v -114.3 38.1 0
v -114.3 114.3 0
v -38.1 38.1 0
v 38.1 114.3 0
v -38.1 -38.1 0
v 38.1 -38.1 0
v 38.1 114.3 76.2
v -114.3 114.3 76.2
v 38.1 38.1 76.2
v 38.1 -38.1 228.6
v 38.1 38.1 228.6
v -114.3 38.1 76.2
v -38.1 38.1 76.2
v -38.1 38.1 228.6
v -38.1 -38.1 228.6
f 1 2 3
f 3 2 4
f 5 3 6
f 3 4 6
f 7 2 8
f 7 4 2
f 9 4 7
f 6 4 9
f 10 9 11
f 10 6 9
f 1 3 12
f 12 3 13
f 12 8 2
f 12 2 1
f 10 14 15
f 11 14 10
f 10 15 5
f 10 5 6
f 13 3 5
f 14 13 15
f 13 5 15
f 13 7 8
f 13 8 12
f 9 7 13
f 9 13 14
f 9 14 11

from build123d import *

# Parameters (mm, degrees)
F1_W     = 76.2
F1_H     = 76.2
F2_DEPTH = 228.6
F3_W     = 76.2
F3_H     = 76.2
F4_DEPTH = 76.2
F5_W     = 76.2
F5_H     = 76.2
F6_DEPTH = 76.2


# Not quite as in the source:
# - a variable given as a bare number and used for a length is read in inches; the dataset says mm whatever the document's units were


with BuildPart() as f2:
    # F1 (on Top) → F2 (new body)
    with BuildSketch(Plane.XY):
        Rectangle(F1_W, F1_H)
    extrude(amount=F2_DEPTH)

    # F3 (on face) → F4 (join)
    with BuildSketch(Plane(origin=(0, 38.1, 0), x_dir=(-1, 0, 0), z_dir=(0, 1, 0))):
        with Locations((0, 38.1)):
            Rectangle(F3_W, F3_H)
    extrude(amount=F4_DEPTH)

    # F5 (on face) → F6 (join)
    with BuildSketch(Plane(origin=(-38.1, 0, 0), x_dir=(0, -1, 0), z_dir=(-1, 0, 0))):
        with Locations((-76.2, 38.1)):
            Rectangle(F5_W, F5_H)
    extrude(amount=F6_DEPTH)


solid = f2.part
